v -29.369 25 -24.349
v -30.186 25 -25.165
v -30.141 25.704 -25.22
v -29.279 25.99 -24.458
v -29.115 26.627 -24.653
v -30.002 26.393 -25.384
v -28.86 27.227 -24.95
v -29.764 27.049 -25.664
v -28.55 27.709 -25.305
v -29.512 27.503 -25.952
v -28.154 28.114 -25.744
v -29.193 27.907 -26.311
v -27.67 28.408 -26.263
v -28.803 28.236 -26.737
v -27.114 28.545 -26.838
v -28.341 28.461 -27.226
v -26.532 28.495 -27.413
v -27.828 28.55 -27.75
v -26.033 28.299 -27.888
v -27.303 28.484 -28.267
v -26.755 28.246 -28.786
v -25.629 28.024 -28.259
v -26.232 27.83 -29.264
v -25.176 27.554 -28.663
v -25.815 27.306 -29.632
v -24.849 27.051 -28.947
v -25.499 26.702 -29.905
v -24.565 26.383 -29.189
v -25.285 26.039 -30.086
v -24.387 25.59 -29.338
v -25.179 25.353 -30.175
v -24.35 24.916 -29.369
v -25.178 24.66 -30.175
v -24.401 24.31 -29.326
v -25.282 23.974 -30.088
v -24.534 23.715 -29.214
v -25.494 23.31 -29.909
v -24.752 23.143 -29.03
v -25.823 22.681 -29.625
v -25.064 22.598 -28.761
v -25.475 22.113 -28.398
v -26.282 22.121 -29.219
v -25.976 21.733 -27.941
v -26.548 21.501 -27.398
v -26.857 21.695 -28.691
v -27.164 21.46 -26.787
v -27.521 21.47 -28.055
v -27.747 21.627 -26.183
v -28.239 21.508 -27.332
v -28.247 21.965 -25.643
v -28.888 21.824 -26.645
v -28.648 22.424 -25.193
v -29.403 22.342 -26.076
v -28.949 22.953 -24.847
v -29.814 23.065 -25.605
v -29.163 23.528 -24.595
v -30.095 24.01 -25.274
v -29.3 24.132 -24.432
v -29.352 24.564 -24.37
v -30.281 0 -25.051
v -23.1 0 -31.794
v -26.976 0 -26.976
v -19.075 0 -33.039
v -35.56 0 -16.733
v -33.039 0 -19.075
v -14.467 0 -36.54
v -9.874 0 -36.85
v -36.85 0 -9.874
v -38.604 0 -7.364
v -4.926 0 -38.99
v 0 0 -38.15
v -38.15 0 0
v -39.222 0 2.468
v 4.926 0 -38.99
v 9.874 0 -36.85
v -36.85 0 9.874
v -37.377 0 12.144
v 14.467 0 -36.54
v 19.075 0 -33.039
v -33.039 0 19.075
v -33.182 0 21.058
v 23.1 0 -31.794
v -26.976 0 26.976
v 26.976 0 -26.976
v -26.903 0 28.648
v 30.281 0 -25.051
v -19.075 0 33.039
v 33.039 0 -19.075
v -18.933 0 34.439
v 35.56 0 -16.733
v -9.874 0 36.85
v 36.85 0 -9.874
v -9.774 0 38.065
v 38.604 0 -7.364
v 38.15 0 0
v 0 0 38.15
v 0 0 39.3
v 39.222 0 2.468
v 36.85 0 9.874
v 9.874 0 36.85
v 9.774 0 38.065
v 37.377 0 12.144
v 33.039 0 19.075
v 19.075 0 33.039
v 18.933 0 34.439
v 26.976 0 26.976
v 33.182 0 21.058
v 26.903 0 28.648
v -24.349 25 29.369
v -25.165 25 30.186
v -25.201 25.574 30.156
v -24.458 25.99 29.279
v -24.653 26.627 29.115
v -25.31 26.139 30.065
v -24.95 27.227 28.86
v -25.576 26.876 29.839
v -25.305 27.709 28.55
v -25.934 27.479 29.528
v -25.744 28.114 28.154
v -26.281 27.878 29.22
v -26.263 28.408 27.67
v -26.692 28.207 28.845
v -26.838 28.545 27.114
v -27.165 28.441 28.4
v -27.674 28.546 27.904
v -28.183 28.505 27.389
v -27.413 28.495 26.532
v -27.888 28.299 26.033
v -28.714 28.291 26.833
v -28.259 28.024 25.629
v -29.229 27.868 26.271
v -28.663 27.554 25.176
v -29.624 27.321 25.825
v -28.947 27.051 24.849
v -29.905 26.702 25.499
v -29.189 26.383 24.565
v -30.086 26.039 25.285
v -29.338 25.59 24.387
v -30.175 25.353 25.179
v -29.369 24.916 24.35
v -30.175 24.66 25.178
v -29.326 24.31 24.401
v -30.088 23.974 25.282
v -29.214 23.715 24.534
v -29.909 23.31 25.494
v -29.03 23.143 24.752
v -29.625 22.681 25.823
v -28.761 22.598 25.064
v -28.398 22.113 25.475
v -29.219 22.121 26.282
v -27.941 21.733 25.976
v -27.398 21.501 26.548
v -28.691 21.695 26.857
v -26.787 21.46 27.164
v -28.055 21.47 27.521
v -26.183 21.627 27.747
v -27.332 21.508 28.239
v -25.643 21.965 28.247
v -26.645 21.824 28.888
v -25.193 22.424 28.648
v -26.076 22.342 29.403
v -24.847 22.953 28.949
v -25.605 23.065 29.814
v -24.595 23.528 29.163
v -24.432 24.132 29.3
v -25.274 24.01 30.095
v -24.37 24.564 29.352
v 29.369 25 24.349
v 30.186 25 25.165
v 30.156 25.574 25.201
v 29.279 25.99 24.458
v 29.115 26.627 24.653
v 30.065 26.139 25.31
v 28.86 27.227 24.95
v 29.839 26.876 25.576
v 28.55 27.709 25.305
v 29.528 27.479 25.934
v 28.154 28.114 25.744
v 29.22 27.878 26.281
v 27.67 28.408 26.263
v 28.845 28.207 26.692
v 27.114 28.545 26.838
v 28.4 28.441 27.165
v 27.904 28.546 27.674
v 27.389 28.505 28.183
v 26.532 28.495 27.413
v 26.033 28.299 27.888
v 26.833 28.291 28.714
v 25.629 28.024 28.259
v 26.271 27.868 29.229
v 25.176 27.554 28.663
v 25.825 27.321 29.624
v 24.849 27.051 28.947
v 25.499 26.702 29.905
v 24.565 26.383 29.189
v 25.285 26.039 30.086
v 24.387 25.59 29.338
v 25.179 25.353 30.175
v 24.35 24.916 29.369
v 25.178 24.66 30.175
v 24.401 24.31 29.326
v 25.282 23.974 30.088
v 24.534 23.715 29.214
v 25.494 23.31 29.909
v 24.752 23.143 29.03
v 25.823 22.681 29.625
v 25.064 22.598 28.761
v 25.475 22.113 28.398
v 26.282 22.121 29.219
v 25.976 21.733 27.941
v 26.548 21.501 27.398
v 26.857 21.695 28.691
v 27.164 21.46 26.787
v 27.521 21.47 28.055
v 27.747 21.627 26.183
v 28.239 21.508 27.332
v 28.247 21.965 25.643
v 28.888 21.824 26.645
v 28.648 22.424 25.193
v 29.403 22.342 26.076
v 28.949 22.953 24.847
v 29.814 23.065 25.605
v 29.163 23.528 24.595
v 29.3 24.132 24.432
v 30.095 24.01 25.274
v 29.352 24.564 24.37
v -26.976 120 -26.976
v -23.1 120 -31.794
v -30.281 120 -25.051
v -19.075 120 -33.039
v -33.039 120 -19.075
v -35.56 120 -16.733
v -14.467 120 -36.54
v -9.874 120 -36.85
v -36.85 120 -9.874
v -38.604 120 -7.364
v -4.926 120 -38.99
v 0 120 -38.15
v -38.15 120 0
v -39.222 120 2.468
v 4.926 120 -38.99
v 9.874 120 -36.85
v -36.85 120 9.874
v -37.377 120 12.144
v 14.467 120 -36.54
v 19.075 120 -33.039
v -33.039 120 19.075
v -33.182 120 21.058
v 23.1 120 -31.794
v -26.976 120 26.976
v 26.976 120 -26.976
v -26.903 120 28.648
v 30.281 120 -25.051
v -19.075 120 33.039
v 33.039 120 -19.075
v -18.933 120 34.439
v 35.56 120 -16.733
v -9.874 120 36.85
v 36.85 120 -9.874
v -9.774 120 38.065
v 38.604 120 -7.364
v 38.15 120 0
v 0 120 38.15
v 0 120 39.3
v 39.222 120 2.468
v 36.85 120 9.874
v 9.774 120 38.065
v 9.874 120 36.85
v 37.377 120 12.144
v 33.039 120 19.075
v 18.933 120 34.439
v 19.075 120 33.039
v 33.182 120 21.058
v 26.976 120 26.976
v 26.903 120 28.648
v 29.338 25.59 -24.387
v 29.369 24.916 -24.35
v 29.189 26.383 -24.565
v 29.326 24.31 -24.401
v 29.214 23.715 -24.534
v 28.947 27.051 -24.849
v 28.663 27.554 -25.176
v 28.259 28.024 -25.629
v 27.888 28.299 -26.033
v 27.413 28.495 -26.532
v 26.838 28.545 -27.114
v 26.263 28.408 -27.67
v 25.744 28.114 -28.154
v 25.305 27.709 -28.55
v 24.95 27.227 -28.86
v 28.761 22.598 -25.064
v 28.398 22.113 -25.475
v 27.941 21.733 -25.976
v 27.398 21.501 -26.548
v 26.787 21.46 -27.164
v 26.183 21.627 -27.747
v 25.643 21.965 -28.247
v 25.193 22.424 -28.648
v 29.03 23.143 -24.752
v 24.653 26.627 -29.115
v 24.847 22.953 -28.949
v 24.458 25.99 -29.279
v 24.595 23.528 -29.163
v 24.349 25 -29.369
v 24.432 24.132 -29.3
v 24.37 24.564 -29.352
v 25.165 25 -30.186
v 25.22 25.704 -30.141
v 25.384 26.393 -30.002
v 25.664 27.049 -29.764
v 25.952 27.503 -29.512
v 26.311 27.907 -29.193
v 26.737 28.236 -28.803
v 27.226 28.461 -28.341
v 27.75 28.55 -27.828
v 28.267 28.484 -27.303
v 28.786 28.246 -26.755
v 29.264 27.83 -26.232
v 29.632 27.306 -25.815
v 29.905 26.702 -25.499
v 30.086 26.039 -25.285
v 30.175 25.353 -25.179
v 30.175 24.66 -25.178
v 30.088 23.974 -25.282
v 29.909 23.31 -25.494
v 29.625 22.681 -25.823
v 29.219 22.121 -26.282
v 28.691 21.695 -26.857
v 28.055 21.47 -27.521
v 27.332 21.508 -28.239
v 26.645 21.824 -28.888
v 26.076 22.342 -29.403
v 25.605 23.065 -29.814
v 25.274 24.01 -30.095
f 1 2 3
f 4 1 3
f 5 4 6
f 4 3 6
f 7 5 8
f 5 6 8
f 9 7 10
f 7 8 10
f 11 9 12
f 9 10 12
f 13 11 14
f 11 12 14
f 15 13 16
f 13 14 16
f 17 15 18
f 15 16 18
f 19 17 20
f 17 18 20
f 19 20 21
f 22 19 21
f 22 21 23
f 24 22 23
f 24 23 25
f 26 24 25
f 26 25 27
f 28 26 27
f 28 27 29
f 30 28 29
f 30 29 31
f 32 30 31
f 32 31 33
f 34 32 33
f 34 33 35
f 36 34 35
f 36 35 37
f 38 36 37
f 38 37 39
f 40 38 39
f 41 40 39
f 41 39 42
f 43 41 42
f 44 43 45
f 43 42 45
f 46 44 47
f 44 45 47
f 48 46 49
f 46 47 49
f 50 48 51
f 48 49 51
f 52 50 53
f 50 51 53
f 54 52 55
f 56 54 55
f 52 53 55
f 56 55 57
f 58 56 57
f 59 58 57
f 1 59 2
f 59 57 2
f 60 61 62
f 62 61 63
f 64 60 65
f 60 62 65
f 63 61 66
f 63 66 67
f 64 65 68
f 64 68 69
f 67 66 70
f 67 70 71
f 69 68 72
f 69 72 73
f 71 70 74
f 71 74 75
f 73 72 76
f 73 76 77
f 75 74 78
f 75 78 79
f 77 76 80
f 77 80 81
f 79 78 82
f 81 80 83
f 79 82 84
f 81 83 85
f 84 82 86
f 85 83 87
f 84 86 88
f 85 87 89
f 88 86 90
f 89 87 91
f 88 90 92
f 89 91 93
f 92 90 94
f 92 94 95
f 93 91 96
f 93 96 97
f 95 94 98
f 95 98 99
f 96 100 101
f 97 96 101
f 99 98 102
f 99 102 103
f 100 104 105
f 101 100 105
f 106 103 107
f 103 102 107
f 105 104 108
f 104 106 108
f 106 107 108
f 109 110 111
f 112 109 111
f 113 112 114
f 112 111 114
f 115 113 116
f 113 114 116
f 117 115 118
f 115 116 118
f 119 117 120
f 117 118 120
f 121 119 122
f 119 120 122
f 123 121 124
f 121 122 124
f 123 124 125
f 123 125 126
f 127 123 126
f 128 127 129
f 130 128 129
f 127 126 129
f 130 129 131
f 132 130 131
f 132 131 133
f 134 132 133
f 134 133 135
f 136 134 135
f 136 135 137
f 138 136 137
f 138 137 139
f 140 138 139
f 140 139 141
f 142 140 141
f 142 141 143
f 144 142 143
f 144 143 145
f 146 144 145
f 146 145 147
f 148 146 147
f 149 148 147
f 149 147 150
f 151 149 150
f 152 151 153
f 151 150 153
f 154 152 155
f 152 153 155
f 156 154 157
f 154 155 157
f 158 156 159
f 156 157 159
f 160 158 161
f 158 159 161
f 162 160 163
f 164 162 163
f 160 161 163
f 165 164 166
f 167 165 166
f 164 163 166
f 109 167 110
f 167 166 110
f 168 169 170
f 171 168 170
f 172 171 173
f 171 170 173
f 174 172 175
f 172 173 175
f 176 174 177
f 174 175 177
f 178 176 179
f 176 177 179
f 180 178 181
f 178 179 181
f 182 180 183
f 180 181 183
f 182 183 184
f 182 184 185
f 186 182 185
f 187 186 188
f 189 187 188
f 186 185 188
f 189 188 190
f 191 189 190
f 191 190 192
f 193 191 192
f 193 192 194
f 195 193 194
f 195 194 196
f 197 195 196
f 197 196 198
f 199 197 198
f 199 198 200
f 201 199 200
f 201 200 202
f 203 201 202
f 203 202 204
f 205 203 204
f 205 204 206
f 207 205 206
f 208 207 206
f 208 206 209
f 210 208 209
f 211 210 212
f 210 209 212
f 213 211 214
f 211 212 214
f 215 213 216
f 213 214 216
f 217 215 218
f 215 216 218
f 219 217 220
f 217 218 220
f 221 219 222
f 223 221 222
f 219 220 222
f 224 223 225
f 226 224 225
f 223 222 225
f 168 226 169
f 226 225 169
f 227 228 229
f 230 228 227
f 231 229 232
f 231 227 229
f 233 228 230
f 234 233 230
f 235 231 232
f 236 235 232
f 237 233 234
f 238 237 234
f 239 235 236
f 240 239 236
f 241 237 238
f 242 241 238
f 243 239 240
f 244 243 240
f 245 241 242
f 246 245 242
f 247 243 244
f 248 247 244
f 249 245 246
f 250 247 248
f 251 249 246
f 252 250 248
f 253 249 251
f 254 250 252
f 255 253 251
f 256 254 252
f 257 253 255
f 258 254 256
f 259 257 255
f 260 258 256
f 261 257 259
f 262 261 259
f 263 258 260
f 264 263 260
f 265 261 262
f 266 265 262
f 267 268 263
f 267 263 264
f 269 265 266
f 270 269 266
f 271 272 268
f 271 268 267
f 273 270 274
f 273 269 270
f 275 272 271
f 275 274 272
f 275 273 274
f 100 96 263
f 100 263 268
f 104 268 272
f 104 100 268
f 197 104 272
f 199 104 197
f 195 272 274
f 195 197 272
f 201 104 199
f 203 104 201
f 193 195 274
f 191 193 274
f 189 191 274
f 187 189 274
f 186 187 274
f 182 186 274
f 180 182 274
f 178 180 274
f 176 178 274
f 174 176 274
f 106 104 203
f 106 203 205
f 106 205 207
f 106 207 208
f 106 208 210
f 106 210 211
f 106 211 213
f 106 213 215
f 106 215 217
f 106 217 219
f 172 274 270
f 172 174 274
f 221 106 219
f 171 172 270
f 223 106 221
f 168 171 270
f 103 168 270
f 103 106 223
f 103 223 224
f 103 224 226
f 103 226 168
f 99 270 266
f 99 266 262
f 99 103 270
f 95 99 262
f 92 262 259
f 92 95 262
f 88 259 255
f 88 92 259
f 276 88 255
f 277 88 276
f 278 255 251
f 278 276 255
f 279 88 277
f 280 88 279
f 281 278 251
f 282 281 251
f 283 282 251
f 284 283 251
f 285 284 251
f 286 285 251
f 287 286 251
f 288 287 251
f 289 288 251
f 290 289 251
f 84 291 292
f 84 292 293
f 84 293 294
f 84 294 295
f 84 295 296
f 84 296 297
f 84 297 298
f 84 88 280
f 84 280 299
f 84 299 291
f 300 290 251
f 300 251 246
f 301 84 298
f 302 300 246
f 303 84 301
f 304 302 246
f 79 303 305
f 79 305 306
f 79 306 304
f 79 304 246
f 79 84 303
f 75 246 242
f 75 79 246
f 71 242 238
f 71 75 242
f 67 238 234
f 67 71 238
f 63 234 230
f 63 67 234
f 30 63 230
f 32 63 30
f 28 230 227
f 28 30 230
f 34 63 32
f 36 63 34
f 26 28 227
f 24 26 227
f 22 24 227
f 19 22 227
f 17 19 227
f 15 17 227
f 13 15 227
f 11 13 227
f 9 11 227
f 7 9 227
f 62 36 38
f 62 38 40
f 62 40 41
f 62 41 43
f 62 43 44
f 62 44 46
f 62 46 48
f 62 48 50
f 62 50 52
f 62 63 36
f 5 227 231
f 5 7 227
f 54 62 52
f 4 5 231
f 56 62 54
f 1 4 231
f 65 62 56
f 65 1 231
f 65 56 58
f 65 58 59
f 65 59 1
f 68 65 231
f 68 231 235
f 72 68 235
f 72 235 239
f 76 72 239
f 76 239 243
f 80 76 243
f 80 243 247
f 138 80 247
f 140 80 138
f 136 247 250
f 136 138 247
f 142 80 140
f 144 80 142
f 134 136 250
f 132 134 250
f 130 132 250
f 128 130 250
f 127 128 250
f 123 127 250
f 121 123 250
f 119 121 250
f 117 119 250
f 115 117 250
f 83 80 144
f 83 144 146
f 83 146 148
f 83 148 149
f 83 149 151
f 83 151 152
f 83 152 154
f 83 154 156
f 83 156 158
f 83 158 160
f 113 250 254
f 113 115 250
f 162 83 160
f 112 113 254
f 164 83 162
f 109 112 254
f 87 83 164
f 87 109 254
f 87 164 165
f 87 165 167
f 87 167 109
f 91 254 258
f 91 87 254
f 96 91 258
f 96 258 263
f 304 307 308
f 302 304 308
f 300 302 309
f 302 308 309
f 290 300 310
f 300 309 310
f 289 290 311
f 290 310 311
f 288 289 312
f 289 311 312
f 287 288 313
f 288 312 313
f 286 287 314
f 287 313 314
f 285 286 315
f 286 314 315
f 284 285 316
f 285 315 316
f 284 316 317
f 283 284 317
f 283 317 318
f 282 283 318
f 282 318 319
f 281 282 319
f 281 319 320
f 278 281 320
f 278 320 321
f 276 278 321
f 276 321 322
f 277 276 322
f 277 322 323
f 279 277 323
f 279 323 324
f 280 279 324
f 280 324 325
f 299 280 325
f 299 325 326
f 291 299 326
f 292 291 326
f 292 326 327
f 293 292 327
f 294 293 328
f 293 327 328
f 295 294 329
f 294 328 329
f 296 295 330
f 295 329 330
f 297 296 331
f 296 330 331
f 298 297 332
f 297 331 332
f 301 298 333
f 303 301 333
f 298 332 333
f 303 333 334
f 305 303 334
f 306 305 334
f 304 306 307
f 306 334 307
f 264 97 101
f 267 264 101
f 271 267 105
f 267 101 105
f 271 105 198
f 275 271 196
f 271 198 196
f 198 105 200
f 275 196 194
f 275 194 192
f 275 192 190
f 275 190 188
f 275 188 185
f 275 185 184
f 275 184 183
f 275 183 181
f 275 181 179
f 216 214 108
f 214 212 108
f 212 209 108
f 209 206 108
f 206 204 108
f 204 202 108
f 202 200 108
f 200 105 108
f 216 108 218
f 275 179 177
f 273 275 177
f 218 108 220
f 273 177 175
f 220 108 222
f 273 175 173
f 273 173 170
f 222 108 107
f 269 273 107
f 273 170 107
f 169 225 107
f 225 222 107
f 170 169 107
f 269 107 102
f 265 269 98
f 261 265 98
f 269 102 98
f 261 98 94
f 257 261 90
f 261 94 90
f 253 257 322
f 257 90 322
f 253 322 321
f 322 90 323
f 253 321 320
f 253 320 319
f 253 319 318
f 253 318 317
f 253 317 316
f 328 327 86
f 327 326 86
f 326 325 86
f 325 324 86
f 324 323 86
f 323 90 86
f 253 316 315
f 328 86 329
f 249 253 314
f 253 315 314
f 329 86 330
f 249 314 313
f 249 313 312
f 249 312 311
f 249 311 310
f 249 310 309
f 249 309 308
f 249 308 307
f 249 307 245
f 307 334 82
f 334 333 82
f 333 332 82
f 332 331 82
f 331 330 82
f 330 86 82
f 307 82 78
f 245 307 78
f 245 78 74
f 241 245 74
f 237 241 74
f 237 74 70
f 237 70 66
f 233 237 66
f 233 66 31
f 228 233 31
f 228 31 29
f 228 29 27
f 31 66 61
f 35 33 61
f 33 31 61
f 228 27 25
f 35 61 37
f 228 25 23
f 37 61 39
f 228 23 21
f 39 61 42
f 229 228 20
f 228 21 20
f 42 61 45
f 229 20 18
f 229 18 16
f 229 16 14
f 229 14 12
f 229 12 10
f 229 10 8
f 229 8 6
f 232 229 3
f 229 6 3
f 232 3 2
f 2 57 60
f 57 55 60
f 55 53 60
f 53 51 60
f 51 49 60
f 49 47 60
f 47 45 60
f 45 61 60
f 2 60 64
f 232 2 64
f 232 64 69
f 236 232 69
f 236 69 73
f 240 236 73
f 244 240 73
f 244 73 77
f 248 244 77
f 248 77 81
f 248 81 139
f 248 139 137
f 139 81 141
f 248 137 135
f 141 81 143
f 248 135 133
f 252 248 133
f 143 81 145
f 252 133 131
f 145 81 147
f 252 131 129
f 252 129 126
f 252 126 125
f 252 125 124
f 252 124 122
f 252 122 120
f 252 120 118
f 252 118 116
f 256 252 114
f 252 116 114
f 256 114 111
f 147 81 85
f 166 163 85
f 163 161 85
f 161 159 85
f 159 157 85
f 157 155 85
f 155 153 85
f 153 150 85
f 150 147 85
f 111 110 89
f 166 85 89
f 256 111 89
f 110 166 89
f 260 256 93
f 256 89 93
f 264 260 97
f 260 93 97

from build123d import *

# Parameters (mm, degrees)
SKETCH1_R               = 39.3
SKETCH1_R_2             = 38.15
BOSS_EXTRUDE1_DEPTH     = 120
CUT_EXTRUDE1_REACH      = 154.977
CUT_EXTRUDE1_END_RADIUS = 38.15
SKETCH2_R               = 3.55
CIRPATTERN1_COUNT       = 4


with BuildPart() as part:
    # Sketch1 → Boss-Extrude1 (new body)
    with BuildSketch(Plane(origin=(0, 0, 0), x_dir=(1, 0, 0), z_dir=(0, 1, 0))):
        with Locations(Location((0, 0, 0), (0, 0, 270))):
            Circle(SKETCH1_R)
        with Locations(Location((0, 0, 0), (0, 0, 270))):
            Circle(SKETCH1_R_2, mode=Mode.SUBTRACT)
    extrude(amount=BOSS_EXTRUDE1_DEPTH)

    # Cut-Extrude1: up to this cylinder (the profile starts outside it)
    cut_extrude1_end = Plane(origin=(0, 25, 0), z_dir=(0, -1, 0)) * Cylinder(CUT_EXTRUDE1_END_RADIUS, 387.254, mode=Mode.PRIVATE)
    # Sketch2 → Cut-Extrude1 (cut, up to the surface)
    with BuildSketch(Plane(origin=(-27.789296501, 0, -27.789296501), x_dir=(0, -1, 0), z_dir=(-0.7071067811865464, 0, -0.7071067811865488)), mode=Mode.PRIVATE) as cut_extrude1_sk1:
        with Locations(Location((-25, 0, 0), (0, 0, 90))):
            Circle(SKETCH2_R)
    cut_extrude1_tool1 = extrude(cut_extrude1_sk1.sketch, amount=-CUT_EXTRUDE1_REACH, mode=Mode.PRIVATE) - cut_extrude1_end
    cut_extrude1 = cut_extrude1_tool1.solids().sort_by_distance((-27.789297, 25, -27.789297))[0]
    add(cut_extrude1, mode=Mode.SUBTRACT)

    # CirPattern1: Cut-Extrude1 ×4 about axis
    cirpattern1_axis = Axis((0, 120, 0), (0, -1, 0))
    for i in range(1, CIRPATTERN1_COUNT):
        add(cut_extrude1.rotate(cirpattern1_axis, i * 360 / CIRPATTERN1_COUNT), mode=Mode.SUBTRACT)


solid = part.part
